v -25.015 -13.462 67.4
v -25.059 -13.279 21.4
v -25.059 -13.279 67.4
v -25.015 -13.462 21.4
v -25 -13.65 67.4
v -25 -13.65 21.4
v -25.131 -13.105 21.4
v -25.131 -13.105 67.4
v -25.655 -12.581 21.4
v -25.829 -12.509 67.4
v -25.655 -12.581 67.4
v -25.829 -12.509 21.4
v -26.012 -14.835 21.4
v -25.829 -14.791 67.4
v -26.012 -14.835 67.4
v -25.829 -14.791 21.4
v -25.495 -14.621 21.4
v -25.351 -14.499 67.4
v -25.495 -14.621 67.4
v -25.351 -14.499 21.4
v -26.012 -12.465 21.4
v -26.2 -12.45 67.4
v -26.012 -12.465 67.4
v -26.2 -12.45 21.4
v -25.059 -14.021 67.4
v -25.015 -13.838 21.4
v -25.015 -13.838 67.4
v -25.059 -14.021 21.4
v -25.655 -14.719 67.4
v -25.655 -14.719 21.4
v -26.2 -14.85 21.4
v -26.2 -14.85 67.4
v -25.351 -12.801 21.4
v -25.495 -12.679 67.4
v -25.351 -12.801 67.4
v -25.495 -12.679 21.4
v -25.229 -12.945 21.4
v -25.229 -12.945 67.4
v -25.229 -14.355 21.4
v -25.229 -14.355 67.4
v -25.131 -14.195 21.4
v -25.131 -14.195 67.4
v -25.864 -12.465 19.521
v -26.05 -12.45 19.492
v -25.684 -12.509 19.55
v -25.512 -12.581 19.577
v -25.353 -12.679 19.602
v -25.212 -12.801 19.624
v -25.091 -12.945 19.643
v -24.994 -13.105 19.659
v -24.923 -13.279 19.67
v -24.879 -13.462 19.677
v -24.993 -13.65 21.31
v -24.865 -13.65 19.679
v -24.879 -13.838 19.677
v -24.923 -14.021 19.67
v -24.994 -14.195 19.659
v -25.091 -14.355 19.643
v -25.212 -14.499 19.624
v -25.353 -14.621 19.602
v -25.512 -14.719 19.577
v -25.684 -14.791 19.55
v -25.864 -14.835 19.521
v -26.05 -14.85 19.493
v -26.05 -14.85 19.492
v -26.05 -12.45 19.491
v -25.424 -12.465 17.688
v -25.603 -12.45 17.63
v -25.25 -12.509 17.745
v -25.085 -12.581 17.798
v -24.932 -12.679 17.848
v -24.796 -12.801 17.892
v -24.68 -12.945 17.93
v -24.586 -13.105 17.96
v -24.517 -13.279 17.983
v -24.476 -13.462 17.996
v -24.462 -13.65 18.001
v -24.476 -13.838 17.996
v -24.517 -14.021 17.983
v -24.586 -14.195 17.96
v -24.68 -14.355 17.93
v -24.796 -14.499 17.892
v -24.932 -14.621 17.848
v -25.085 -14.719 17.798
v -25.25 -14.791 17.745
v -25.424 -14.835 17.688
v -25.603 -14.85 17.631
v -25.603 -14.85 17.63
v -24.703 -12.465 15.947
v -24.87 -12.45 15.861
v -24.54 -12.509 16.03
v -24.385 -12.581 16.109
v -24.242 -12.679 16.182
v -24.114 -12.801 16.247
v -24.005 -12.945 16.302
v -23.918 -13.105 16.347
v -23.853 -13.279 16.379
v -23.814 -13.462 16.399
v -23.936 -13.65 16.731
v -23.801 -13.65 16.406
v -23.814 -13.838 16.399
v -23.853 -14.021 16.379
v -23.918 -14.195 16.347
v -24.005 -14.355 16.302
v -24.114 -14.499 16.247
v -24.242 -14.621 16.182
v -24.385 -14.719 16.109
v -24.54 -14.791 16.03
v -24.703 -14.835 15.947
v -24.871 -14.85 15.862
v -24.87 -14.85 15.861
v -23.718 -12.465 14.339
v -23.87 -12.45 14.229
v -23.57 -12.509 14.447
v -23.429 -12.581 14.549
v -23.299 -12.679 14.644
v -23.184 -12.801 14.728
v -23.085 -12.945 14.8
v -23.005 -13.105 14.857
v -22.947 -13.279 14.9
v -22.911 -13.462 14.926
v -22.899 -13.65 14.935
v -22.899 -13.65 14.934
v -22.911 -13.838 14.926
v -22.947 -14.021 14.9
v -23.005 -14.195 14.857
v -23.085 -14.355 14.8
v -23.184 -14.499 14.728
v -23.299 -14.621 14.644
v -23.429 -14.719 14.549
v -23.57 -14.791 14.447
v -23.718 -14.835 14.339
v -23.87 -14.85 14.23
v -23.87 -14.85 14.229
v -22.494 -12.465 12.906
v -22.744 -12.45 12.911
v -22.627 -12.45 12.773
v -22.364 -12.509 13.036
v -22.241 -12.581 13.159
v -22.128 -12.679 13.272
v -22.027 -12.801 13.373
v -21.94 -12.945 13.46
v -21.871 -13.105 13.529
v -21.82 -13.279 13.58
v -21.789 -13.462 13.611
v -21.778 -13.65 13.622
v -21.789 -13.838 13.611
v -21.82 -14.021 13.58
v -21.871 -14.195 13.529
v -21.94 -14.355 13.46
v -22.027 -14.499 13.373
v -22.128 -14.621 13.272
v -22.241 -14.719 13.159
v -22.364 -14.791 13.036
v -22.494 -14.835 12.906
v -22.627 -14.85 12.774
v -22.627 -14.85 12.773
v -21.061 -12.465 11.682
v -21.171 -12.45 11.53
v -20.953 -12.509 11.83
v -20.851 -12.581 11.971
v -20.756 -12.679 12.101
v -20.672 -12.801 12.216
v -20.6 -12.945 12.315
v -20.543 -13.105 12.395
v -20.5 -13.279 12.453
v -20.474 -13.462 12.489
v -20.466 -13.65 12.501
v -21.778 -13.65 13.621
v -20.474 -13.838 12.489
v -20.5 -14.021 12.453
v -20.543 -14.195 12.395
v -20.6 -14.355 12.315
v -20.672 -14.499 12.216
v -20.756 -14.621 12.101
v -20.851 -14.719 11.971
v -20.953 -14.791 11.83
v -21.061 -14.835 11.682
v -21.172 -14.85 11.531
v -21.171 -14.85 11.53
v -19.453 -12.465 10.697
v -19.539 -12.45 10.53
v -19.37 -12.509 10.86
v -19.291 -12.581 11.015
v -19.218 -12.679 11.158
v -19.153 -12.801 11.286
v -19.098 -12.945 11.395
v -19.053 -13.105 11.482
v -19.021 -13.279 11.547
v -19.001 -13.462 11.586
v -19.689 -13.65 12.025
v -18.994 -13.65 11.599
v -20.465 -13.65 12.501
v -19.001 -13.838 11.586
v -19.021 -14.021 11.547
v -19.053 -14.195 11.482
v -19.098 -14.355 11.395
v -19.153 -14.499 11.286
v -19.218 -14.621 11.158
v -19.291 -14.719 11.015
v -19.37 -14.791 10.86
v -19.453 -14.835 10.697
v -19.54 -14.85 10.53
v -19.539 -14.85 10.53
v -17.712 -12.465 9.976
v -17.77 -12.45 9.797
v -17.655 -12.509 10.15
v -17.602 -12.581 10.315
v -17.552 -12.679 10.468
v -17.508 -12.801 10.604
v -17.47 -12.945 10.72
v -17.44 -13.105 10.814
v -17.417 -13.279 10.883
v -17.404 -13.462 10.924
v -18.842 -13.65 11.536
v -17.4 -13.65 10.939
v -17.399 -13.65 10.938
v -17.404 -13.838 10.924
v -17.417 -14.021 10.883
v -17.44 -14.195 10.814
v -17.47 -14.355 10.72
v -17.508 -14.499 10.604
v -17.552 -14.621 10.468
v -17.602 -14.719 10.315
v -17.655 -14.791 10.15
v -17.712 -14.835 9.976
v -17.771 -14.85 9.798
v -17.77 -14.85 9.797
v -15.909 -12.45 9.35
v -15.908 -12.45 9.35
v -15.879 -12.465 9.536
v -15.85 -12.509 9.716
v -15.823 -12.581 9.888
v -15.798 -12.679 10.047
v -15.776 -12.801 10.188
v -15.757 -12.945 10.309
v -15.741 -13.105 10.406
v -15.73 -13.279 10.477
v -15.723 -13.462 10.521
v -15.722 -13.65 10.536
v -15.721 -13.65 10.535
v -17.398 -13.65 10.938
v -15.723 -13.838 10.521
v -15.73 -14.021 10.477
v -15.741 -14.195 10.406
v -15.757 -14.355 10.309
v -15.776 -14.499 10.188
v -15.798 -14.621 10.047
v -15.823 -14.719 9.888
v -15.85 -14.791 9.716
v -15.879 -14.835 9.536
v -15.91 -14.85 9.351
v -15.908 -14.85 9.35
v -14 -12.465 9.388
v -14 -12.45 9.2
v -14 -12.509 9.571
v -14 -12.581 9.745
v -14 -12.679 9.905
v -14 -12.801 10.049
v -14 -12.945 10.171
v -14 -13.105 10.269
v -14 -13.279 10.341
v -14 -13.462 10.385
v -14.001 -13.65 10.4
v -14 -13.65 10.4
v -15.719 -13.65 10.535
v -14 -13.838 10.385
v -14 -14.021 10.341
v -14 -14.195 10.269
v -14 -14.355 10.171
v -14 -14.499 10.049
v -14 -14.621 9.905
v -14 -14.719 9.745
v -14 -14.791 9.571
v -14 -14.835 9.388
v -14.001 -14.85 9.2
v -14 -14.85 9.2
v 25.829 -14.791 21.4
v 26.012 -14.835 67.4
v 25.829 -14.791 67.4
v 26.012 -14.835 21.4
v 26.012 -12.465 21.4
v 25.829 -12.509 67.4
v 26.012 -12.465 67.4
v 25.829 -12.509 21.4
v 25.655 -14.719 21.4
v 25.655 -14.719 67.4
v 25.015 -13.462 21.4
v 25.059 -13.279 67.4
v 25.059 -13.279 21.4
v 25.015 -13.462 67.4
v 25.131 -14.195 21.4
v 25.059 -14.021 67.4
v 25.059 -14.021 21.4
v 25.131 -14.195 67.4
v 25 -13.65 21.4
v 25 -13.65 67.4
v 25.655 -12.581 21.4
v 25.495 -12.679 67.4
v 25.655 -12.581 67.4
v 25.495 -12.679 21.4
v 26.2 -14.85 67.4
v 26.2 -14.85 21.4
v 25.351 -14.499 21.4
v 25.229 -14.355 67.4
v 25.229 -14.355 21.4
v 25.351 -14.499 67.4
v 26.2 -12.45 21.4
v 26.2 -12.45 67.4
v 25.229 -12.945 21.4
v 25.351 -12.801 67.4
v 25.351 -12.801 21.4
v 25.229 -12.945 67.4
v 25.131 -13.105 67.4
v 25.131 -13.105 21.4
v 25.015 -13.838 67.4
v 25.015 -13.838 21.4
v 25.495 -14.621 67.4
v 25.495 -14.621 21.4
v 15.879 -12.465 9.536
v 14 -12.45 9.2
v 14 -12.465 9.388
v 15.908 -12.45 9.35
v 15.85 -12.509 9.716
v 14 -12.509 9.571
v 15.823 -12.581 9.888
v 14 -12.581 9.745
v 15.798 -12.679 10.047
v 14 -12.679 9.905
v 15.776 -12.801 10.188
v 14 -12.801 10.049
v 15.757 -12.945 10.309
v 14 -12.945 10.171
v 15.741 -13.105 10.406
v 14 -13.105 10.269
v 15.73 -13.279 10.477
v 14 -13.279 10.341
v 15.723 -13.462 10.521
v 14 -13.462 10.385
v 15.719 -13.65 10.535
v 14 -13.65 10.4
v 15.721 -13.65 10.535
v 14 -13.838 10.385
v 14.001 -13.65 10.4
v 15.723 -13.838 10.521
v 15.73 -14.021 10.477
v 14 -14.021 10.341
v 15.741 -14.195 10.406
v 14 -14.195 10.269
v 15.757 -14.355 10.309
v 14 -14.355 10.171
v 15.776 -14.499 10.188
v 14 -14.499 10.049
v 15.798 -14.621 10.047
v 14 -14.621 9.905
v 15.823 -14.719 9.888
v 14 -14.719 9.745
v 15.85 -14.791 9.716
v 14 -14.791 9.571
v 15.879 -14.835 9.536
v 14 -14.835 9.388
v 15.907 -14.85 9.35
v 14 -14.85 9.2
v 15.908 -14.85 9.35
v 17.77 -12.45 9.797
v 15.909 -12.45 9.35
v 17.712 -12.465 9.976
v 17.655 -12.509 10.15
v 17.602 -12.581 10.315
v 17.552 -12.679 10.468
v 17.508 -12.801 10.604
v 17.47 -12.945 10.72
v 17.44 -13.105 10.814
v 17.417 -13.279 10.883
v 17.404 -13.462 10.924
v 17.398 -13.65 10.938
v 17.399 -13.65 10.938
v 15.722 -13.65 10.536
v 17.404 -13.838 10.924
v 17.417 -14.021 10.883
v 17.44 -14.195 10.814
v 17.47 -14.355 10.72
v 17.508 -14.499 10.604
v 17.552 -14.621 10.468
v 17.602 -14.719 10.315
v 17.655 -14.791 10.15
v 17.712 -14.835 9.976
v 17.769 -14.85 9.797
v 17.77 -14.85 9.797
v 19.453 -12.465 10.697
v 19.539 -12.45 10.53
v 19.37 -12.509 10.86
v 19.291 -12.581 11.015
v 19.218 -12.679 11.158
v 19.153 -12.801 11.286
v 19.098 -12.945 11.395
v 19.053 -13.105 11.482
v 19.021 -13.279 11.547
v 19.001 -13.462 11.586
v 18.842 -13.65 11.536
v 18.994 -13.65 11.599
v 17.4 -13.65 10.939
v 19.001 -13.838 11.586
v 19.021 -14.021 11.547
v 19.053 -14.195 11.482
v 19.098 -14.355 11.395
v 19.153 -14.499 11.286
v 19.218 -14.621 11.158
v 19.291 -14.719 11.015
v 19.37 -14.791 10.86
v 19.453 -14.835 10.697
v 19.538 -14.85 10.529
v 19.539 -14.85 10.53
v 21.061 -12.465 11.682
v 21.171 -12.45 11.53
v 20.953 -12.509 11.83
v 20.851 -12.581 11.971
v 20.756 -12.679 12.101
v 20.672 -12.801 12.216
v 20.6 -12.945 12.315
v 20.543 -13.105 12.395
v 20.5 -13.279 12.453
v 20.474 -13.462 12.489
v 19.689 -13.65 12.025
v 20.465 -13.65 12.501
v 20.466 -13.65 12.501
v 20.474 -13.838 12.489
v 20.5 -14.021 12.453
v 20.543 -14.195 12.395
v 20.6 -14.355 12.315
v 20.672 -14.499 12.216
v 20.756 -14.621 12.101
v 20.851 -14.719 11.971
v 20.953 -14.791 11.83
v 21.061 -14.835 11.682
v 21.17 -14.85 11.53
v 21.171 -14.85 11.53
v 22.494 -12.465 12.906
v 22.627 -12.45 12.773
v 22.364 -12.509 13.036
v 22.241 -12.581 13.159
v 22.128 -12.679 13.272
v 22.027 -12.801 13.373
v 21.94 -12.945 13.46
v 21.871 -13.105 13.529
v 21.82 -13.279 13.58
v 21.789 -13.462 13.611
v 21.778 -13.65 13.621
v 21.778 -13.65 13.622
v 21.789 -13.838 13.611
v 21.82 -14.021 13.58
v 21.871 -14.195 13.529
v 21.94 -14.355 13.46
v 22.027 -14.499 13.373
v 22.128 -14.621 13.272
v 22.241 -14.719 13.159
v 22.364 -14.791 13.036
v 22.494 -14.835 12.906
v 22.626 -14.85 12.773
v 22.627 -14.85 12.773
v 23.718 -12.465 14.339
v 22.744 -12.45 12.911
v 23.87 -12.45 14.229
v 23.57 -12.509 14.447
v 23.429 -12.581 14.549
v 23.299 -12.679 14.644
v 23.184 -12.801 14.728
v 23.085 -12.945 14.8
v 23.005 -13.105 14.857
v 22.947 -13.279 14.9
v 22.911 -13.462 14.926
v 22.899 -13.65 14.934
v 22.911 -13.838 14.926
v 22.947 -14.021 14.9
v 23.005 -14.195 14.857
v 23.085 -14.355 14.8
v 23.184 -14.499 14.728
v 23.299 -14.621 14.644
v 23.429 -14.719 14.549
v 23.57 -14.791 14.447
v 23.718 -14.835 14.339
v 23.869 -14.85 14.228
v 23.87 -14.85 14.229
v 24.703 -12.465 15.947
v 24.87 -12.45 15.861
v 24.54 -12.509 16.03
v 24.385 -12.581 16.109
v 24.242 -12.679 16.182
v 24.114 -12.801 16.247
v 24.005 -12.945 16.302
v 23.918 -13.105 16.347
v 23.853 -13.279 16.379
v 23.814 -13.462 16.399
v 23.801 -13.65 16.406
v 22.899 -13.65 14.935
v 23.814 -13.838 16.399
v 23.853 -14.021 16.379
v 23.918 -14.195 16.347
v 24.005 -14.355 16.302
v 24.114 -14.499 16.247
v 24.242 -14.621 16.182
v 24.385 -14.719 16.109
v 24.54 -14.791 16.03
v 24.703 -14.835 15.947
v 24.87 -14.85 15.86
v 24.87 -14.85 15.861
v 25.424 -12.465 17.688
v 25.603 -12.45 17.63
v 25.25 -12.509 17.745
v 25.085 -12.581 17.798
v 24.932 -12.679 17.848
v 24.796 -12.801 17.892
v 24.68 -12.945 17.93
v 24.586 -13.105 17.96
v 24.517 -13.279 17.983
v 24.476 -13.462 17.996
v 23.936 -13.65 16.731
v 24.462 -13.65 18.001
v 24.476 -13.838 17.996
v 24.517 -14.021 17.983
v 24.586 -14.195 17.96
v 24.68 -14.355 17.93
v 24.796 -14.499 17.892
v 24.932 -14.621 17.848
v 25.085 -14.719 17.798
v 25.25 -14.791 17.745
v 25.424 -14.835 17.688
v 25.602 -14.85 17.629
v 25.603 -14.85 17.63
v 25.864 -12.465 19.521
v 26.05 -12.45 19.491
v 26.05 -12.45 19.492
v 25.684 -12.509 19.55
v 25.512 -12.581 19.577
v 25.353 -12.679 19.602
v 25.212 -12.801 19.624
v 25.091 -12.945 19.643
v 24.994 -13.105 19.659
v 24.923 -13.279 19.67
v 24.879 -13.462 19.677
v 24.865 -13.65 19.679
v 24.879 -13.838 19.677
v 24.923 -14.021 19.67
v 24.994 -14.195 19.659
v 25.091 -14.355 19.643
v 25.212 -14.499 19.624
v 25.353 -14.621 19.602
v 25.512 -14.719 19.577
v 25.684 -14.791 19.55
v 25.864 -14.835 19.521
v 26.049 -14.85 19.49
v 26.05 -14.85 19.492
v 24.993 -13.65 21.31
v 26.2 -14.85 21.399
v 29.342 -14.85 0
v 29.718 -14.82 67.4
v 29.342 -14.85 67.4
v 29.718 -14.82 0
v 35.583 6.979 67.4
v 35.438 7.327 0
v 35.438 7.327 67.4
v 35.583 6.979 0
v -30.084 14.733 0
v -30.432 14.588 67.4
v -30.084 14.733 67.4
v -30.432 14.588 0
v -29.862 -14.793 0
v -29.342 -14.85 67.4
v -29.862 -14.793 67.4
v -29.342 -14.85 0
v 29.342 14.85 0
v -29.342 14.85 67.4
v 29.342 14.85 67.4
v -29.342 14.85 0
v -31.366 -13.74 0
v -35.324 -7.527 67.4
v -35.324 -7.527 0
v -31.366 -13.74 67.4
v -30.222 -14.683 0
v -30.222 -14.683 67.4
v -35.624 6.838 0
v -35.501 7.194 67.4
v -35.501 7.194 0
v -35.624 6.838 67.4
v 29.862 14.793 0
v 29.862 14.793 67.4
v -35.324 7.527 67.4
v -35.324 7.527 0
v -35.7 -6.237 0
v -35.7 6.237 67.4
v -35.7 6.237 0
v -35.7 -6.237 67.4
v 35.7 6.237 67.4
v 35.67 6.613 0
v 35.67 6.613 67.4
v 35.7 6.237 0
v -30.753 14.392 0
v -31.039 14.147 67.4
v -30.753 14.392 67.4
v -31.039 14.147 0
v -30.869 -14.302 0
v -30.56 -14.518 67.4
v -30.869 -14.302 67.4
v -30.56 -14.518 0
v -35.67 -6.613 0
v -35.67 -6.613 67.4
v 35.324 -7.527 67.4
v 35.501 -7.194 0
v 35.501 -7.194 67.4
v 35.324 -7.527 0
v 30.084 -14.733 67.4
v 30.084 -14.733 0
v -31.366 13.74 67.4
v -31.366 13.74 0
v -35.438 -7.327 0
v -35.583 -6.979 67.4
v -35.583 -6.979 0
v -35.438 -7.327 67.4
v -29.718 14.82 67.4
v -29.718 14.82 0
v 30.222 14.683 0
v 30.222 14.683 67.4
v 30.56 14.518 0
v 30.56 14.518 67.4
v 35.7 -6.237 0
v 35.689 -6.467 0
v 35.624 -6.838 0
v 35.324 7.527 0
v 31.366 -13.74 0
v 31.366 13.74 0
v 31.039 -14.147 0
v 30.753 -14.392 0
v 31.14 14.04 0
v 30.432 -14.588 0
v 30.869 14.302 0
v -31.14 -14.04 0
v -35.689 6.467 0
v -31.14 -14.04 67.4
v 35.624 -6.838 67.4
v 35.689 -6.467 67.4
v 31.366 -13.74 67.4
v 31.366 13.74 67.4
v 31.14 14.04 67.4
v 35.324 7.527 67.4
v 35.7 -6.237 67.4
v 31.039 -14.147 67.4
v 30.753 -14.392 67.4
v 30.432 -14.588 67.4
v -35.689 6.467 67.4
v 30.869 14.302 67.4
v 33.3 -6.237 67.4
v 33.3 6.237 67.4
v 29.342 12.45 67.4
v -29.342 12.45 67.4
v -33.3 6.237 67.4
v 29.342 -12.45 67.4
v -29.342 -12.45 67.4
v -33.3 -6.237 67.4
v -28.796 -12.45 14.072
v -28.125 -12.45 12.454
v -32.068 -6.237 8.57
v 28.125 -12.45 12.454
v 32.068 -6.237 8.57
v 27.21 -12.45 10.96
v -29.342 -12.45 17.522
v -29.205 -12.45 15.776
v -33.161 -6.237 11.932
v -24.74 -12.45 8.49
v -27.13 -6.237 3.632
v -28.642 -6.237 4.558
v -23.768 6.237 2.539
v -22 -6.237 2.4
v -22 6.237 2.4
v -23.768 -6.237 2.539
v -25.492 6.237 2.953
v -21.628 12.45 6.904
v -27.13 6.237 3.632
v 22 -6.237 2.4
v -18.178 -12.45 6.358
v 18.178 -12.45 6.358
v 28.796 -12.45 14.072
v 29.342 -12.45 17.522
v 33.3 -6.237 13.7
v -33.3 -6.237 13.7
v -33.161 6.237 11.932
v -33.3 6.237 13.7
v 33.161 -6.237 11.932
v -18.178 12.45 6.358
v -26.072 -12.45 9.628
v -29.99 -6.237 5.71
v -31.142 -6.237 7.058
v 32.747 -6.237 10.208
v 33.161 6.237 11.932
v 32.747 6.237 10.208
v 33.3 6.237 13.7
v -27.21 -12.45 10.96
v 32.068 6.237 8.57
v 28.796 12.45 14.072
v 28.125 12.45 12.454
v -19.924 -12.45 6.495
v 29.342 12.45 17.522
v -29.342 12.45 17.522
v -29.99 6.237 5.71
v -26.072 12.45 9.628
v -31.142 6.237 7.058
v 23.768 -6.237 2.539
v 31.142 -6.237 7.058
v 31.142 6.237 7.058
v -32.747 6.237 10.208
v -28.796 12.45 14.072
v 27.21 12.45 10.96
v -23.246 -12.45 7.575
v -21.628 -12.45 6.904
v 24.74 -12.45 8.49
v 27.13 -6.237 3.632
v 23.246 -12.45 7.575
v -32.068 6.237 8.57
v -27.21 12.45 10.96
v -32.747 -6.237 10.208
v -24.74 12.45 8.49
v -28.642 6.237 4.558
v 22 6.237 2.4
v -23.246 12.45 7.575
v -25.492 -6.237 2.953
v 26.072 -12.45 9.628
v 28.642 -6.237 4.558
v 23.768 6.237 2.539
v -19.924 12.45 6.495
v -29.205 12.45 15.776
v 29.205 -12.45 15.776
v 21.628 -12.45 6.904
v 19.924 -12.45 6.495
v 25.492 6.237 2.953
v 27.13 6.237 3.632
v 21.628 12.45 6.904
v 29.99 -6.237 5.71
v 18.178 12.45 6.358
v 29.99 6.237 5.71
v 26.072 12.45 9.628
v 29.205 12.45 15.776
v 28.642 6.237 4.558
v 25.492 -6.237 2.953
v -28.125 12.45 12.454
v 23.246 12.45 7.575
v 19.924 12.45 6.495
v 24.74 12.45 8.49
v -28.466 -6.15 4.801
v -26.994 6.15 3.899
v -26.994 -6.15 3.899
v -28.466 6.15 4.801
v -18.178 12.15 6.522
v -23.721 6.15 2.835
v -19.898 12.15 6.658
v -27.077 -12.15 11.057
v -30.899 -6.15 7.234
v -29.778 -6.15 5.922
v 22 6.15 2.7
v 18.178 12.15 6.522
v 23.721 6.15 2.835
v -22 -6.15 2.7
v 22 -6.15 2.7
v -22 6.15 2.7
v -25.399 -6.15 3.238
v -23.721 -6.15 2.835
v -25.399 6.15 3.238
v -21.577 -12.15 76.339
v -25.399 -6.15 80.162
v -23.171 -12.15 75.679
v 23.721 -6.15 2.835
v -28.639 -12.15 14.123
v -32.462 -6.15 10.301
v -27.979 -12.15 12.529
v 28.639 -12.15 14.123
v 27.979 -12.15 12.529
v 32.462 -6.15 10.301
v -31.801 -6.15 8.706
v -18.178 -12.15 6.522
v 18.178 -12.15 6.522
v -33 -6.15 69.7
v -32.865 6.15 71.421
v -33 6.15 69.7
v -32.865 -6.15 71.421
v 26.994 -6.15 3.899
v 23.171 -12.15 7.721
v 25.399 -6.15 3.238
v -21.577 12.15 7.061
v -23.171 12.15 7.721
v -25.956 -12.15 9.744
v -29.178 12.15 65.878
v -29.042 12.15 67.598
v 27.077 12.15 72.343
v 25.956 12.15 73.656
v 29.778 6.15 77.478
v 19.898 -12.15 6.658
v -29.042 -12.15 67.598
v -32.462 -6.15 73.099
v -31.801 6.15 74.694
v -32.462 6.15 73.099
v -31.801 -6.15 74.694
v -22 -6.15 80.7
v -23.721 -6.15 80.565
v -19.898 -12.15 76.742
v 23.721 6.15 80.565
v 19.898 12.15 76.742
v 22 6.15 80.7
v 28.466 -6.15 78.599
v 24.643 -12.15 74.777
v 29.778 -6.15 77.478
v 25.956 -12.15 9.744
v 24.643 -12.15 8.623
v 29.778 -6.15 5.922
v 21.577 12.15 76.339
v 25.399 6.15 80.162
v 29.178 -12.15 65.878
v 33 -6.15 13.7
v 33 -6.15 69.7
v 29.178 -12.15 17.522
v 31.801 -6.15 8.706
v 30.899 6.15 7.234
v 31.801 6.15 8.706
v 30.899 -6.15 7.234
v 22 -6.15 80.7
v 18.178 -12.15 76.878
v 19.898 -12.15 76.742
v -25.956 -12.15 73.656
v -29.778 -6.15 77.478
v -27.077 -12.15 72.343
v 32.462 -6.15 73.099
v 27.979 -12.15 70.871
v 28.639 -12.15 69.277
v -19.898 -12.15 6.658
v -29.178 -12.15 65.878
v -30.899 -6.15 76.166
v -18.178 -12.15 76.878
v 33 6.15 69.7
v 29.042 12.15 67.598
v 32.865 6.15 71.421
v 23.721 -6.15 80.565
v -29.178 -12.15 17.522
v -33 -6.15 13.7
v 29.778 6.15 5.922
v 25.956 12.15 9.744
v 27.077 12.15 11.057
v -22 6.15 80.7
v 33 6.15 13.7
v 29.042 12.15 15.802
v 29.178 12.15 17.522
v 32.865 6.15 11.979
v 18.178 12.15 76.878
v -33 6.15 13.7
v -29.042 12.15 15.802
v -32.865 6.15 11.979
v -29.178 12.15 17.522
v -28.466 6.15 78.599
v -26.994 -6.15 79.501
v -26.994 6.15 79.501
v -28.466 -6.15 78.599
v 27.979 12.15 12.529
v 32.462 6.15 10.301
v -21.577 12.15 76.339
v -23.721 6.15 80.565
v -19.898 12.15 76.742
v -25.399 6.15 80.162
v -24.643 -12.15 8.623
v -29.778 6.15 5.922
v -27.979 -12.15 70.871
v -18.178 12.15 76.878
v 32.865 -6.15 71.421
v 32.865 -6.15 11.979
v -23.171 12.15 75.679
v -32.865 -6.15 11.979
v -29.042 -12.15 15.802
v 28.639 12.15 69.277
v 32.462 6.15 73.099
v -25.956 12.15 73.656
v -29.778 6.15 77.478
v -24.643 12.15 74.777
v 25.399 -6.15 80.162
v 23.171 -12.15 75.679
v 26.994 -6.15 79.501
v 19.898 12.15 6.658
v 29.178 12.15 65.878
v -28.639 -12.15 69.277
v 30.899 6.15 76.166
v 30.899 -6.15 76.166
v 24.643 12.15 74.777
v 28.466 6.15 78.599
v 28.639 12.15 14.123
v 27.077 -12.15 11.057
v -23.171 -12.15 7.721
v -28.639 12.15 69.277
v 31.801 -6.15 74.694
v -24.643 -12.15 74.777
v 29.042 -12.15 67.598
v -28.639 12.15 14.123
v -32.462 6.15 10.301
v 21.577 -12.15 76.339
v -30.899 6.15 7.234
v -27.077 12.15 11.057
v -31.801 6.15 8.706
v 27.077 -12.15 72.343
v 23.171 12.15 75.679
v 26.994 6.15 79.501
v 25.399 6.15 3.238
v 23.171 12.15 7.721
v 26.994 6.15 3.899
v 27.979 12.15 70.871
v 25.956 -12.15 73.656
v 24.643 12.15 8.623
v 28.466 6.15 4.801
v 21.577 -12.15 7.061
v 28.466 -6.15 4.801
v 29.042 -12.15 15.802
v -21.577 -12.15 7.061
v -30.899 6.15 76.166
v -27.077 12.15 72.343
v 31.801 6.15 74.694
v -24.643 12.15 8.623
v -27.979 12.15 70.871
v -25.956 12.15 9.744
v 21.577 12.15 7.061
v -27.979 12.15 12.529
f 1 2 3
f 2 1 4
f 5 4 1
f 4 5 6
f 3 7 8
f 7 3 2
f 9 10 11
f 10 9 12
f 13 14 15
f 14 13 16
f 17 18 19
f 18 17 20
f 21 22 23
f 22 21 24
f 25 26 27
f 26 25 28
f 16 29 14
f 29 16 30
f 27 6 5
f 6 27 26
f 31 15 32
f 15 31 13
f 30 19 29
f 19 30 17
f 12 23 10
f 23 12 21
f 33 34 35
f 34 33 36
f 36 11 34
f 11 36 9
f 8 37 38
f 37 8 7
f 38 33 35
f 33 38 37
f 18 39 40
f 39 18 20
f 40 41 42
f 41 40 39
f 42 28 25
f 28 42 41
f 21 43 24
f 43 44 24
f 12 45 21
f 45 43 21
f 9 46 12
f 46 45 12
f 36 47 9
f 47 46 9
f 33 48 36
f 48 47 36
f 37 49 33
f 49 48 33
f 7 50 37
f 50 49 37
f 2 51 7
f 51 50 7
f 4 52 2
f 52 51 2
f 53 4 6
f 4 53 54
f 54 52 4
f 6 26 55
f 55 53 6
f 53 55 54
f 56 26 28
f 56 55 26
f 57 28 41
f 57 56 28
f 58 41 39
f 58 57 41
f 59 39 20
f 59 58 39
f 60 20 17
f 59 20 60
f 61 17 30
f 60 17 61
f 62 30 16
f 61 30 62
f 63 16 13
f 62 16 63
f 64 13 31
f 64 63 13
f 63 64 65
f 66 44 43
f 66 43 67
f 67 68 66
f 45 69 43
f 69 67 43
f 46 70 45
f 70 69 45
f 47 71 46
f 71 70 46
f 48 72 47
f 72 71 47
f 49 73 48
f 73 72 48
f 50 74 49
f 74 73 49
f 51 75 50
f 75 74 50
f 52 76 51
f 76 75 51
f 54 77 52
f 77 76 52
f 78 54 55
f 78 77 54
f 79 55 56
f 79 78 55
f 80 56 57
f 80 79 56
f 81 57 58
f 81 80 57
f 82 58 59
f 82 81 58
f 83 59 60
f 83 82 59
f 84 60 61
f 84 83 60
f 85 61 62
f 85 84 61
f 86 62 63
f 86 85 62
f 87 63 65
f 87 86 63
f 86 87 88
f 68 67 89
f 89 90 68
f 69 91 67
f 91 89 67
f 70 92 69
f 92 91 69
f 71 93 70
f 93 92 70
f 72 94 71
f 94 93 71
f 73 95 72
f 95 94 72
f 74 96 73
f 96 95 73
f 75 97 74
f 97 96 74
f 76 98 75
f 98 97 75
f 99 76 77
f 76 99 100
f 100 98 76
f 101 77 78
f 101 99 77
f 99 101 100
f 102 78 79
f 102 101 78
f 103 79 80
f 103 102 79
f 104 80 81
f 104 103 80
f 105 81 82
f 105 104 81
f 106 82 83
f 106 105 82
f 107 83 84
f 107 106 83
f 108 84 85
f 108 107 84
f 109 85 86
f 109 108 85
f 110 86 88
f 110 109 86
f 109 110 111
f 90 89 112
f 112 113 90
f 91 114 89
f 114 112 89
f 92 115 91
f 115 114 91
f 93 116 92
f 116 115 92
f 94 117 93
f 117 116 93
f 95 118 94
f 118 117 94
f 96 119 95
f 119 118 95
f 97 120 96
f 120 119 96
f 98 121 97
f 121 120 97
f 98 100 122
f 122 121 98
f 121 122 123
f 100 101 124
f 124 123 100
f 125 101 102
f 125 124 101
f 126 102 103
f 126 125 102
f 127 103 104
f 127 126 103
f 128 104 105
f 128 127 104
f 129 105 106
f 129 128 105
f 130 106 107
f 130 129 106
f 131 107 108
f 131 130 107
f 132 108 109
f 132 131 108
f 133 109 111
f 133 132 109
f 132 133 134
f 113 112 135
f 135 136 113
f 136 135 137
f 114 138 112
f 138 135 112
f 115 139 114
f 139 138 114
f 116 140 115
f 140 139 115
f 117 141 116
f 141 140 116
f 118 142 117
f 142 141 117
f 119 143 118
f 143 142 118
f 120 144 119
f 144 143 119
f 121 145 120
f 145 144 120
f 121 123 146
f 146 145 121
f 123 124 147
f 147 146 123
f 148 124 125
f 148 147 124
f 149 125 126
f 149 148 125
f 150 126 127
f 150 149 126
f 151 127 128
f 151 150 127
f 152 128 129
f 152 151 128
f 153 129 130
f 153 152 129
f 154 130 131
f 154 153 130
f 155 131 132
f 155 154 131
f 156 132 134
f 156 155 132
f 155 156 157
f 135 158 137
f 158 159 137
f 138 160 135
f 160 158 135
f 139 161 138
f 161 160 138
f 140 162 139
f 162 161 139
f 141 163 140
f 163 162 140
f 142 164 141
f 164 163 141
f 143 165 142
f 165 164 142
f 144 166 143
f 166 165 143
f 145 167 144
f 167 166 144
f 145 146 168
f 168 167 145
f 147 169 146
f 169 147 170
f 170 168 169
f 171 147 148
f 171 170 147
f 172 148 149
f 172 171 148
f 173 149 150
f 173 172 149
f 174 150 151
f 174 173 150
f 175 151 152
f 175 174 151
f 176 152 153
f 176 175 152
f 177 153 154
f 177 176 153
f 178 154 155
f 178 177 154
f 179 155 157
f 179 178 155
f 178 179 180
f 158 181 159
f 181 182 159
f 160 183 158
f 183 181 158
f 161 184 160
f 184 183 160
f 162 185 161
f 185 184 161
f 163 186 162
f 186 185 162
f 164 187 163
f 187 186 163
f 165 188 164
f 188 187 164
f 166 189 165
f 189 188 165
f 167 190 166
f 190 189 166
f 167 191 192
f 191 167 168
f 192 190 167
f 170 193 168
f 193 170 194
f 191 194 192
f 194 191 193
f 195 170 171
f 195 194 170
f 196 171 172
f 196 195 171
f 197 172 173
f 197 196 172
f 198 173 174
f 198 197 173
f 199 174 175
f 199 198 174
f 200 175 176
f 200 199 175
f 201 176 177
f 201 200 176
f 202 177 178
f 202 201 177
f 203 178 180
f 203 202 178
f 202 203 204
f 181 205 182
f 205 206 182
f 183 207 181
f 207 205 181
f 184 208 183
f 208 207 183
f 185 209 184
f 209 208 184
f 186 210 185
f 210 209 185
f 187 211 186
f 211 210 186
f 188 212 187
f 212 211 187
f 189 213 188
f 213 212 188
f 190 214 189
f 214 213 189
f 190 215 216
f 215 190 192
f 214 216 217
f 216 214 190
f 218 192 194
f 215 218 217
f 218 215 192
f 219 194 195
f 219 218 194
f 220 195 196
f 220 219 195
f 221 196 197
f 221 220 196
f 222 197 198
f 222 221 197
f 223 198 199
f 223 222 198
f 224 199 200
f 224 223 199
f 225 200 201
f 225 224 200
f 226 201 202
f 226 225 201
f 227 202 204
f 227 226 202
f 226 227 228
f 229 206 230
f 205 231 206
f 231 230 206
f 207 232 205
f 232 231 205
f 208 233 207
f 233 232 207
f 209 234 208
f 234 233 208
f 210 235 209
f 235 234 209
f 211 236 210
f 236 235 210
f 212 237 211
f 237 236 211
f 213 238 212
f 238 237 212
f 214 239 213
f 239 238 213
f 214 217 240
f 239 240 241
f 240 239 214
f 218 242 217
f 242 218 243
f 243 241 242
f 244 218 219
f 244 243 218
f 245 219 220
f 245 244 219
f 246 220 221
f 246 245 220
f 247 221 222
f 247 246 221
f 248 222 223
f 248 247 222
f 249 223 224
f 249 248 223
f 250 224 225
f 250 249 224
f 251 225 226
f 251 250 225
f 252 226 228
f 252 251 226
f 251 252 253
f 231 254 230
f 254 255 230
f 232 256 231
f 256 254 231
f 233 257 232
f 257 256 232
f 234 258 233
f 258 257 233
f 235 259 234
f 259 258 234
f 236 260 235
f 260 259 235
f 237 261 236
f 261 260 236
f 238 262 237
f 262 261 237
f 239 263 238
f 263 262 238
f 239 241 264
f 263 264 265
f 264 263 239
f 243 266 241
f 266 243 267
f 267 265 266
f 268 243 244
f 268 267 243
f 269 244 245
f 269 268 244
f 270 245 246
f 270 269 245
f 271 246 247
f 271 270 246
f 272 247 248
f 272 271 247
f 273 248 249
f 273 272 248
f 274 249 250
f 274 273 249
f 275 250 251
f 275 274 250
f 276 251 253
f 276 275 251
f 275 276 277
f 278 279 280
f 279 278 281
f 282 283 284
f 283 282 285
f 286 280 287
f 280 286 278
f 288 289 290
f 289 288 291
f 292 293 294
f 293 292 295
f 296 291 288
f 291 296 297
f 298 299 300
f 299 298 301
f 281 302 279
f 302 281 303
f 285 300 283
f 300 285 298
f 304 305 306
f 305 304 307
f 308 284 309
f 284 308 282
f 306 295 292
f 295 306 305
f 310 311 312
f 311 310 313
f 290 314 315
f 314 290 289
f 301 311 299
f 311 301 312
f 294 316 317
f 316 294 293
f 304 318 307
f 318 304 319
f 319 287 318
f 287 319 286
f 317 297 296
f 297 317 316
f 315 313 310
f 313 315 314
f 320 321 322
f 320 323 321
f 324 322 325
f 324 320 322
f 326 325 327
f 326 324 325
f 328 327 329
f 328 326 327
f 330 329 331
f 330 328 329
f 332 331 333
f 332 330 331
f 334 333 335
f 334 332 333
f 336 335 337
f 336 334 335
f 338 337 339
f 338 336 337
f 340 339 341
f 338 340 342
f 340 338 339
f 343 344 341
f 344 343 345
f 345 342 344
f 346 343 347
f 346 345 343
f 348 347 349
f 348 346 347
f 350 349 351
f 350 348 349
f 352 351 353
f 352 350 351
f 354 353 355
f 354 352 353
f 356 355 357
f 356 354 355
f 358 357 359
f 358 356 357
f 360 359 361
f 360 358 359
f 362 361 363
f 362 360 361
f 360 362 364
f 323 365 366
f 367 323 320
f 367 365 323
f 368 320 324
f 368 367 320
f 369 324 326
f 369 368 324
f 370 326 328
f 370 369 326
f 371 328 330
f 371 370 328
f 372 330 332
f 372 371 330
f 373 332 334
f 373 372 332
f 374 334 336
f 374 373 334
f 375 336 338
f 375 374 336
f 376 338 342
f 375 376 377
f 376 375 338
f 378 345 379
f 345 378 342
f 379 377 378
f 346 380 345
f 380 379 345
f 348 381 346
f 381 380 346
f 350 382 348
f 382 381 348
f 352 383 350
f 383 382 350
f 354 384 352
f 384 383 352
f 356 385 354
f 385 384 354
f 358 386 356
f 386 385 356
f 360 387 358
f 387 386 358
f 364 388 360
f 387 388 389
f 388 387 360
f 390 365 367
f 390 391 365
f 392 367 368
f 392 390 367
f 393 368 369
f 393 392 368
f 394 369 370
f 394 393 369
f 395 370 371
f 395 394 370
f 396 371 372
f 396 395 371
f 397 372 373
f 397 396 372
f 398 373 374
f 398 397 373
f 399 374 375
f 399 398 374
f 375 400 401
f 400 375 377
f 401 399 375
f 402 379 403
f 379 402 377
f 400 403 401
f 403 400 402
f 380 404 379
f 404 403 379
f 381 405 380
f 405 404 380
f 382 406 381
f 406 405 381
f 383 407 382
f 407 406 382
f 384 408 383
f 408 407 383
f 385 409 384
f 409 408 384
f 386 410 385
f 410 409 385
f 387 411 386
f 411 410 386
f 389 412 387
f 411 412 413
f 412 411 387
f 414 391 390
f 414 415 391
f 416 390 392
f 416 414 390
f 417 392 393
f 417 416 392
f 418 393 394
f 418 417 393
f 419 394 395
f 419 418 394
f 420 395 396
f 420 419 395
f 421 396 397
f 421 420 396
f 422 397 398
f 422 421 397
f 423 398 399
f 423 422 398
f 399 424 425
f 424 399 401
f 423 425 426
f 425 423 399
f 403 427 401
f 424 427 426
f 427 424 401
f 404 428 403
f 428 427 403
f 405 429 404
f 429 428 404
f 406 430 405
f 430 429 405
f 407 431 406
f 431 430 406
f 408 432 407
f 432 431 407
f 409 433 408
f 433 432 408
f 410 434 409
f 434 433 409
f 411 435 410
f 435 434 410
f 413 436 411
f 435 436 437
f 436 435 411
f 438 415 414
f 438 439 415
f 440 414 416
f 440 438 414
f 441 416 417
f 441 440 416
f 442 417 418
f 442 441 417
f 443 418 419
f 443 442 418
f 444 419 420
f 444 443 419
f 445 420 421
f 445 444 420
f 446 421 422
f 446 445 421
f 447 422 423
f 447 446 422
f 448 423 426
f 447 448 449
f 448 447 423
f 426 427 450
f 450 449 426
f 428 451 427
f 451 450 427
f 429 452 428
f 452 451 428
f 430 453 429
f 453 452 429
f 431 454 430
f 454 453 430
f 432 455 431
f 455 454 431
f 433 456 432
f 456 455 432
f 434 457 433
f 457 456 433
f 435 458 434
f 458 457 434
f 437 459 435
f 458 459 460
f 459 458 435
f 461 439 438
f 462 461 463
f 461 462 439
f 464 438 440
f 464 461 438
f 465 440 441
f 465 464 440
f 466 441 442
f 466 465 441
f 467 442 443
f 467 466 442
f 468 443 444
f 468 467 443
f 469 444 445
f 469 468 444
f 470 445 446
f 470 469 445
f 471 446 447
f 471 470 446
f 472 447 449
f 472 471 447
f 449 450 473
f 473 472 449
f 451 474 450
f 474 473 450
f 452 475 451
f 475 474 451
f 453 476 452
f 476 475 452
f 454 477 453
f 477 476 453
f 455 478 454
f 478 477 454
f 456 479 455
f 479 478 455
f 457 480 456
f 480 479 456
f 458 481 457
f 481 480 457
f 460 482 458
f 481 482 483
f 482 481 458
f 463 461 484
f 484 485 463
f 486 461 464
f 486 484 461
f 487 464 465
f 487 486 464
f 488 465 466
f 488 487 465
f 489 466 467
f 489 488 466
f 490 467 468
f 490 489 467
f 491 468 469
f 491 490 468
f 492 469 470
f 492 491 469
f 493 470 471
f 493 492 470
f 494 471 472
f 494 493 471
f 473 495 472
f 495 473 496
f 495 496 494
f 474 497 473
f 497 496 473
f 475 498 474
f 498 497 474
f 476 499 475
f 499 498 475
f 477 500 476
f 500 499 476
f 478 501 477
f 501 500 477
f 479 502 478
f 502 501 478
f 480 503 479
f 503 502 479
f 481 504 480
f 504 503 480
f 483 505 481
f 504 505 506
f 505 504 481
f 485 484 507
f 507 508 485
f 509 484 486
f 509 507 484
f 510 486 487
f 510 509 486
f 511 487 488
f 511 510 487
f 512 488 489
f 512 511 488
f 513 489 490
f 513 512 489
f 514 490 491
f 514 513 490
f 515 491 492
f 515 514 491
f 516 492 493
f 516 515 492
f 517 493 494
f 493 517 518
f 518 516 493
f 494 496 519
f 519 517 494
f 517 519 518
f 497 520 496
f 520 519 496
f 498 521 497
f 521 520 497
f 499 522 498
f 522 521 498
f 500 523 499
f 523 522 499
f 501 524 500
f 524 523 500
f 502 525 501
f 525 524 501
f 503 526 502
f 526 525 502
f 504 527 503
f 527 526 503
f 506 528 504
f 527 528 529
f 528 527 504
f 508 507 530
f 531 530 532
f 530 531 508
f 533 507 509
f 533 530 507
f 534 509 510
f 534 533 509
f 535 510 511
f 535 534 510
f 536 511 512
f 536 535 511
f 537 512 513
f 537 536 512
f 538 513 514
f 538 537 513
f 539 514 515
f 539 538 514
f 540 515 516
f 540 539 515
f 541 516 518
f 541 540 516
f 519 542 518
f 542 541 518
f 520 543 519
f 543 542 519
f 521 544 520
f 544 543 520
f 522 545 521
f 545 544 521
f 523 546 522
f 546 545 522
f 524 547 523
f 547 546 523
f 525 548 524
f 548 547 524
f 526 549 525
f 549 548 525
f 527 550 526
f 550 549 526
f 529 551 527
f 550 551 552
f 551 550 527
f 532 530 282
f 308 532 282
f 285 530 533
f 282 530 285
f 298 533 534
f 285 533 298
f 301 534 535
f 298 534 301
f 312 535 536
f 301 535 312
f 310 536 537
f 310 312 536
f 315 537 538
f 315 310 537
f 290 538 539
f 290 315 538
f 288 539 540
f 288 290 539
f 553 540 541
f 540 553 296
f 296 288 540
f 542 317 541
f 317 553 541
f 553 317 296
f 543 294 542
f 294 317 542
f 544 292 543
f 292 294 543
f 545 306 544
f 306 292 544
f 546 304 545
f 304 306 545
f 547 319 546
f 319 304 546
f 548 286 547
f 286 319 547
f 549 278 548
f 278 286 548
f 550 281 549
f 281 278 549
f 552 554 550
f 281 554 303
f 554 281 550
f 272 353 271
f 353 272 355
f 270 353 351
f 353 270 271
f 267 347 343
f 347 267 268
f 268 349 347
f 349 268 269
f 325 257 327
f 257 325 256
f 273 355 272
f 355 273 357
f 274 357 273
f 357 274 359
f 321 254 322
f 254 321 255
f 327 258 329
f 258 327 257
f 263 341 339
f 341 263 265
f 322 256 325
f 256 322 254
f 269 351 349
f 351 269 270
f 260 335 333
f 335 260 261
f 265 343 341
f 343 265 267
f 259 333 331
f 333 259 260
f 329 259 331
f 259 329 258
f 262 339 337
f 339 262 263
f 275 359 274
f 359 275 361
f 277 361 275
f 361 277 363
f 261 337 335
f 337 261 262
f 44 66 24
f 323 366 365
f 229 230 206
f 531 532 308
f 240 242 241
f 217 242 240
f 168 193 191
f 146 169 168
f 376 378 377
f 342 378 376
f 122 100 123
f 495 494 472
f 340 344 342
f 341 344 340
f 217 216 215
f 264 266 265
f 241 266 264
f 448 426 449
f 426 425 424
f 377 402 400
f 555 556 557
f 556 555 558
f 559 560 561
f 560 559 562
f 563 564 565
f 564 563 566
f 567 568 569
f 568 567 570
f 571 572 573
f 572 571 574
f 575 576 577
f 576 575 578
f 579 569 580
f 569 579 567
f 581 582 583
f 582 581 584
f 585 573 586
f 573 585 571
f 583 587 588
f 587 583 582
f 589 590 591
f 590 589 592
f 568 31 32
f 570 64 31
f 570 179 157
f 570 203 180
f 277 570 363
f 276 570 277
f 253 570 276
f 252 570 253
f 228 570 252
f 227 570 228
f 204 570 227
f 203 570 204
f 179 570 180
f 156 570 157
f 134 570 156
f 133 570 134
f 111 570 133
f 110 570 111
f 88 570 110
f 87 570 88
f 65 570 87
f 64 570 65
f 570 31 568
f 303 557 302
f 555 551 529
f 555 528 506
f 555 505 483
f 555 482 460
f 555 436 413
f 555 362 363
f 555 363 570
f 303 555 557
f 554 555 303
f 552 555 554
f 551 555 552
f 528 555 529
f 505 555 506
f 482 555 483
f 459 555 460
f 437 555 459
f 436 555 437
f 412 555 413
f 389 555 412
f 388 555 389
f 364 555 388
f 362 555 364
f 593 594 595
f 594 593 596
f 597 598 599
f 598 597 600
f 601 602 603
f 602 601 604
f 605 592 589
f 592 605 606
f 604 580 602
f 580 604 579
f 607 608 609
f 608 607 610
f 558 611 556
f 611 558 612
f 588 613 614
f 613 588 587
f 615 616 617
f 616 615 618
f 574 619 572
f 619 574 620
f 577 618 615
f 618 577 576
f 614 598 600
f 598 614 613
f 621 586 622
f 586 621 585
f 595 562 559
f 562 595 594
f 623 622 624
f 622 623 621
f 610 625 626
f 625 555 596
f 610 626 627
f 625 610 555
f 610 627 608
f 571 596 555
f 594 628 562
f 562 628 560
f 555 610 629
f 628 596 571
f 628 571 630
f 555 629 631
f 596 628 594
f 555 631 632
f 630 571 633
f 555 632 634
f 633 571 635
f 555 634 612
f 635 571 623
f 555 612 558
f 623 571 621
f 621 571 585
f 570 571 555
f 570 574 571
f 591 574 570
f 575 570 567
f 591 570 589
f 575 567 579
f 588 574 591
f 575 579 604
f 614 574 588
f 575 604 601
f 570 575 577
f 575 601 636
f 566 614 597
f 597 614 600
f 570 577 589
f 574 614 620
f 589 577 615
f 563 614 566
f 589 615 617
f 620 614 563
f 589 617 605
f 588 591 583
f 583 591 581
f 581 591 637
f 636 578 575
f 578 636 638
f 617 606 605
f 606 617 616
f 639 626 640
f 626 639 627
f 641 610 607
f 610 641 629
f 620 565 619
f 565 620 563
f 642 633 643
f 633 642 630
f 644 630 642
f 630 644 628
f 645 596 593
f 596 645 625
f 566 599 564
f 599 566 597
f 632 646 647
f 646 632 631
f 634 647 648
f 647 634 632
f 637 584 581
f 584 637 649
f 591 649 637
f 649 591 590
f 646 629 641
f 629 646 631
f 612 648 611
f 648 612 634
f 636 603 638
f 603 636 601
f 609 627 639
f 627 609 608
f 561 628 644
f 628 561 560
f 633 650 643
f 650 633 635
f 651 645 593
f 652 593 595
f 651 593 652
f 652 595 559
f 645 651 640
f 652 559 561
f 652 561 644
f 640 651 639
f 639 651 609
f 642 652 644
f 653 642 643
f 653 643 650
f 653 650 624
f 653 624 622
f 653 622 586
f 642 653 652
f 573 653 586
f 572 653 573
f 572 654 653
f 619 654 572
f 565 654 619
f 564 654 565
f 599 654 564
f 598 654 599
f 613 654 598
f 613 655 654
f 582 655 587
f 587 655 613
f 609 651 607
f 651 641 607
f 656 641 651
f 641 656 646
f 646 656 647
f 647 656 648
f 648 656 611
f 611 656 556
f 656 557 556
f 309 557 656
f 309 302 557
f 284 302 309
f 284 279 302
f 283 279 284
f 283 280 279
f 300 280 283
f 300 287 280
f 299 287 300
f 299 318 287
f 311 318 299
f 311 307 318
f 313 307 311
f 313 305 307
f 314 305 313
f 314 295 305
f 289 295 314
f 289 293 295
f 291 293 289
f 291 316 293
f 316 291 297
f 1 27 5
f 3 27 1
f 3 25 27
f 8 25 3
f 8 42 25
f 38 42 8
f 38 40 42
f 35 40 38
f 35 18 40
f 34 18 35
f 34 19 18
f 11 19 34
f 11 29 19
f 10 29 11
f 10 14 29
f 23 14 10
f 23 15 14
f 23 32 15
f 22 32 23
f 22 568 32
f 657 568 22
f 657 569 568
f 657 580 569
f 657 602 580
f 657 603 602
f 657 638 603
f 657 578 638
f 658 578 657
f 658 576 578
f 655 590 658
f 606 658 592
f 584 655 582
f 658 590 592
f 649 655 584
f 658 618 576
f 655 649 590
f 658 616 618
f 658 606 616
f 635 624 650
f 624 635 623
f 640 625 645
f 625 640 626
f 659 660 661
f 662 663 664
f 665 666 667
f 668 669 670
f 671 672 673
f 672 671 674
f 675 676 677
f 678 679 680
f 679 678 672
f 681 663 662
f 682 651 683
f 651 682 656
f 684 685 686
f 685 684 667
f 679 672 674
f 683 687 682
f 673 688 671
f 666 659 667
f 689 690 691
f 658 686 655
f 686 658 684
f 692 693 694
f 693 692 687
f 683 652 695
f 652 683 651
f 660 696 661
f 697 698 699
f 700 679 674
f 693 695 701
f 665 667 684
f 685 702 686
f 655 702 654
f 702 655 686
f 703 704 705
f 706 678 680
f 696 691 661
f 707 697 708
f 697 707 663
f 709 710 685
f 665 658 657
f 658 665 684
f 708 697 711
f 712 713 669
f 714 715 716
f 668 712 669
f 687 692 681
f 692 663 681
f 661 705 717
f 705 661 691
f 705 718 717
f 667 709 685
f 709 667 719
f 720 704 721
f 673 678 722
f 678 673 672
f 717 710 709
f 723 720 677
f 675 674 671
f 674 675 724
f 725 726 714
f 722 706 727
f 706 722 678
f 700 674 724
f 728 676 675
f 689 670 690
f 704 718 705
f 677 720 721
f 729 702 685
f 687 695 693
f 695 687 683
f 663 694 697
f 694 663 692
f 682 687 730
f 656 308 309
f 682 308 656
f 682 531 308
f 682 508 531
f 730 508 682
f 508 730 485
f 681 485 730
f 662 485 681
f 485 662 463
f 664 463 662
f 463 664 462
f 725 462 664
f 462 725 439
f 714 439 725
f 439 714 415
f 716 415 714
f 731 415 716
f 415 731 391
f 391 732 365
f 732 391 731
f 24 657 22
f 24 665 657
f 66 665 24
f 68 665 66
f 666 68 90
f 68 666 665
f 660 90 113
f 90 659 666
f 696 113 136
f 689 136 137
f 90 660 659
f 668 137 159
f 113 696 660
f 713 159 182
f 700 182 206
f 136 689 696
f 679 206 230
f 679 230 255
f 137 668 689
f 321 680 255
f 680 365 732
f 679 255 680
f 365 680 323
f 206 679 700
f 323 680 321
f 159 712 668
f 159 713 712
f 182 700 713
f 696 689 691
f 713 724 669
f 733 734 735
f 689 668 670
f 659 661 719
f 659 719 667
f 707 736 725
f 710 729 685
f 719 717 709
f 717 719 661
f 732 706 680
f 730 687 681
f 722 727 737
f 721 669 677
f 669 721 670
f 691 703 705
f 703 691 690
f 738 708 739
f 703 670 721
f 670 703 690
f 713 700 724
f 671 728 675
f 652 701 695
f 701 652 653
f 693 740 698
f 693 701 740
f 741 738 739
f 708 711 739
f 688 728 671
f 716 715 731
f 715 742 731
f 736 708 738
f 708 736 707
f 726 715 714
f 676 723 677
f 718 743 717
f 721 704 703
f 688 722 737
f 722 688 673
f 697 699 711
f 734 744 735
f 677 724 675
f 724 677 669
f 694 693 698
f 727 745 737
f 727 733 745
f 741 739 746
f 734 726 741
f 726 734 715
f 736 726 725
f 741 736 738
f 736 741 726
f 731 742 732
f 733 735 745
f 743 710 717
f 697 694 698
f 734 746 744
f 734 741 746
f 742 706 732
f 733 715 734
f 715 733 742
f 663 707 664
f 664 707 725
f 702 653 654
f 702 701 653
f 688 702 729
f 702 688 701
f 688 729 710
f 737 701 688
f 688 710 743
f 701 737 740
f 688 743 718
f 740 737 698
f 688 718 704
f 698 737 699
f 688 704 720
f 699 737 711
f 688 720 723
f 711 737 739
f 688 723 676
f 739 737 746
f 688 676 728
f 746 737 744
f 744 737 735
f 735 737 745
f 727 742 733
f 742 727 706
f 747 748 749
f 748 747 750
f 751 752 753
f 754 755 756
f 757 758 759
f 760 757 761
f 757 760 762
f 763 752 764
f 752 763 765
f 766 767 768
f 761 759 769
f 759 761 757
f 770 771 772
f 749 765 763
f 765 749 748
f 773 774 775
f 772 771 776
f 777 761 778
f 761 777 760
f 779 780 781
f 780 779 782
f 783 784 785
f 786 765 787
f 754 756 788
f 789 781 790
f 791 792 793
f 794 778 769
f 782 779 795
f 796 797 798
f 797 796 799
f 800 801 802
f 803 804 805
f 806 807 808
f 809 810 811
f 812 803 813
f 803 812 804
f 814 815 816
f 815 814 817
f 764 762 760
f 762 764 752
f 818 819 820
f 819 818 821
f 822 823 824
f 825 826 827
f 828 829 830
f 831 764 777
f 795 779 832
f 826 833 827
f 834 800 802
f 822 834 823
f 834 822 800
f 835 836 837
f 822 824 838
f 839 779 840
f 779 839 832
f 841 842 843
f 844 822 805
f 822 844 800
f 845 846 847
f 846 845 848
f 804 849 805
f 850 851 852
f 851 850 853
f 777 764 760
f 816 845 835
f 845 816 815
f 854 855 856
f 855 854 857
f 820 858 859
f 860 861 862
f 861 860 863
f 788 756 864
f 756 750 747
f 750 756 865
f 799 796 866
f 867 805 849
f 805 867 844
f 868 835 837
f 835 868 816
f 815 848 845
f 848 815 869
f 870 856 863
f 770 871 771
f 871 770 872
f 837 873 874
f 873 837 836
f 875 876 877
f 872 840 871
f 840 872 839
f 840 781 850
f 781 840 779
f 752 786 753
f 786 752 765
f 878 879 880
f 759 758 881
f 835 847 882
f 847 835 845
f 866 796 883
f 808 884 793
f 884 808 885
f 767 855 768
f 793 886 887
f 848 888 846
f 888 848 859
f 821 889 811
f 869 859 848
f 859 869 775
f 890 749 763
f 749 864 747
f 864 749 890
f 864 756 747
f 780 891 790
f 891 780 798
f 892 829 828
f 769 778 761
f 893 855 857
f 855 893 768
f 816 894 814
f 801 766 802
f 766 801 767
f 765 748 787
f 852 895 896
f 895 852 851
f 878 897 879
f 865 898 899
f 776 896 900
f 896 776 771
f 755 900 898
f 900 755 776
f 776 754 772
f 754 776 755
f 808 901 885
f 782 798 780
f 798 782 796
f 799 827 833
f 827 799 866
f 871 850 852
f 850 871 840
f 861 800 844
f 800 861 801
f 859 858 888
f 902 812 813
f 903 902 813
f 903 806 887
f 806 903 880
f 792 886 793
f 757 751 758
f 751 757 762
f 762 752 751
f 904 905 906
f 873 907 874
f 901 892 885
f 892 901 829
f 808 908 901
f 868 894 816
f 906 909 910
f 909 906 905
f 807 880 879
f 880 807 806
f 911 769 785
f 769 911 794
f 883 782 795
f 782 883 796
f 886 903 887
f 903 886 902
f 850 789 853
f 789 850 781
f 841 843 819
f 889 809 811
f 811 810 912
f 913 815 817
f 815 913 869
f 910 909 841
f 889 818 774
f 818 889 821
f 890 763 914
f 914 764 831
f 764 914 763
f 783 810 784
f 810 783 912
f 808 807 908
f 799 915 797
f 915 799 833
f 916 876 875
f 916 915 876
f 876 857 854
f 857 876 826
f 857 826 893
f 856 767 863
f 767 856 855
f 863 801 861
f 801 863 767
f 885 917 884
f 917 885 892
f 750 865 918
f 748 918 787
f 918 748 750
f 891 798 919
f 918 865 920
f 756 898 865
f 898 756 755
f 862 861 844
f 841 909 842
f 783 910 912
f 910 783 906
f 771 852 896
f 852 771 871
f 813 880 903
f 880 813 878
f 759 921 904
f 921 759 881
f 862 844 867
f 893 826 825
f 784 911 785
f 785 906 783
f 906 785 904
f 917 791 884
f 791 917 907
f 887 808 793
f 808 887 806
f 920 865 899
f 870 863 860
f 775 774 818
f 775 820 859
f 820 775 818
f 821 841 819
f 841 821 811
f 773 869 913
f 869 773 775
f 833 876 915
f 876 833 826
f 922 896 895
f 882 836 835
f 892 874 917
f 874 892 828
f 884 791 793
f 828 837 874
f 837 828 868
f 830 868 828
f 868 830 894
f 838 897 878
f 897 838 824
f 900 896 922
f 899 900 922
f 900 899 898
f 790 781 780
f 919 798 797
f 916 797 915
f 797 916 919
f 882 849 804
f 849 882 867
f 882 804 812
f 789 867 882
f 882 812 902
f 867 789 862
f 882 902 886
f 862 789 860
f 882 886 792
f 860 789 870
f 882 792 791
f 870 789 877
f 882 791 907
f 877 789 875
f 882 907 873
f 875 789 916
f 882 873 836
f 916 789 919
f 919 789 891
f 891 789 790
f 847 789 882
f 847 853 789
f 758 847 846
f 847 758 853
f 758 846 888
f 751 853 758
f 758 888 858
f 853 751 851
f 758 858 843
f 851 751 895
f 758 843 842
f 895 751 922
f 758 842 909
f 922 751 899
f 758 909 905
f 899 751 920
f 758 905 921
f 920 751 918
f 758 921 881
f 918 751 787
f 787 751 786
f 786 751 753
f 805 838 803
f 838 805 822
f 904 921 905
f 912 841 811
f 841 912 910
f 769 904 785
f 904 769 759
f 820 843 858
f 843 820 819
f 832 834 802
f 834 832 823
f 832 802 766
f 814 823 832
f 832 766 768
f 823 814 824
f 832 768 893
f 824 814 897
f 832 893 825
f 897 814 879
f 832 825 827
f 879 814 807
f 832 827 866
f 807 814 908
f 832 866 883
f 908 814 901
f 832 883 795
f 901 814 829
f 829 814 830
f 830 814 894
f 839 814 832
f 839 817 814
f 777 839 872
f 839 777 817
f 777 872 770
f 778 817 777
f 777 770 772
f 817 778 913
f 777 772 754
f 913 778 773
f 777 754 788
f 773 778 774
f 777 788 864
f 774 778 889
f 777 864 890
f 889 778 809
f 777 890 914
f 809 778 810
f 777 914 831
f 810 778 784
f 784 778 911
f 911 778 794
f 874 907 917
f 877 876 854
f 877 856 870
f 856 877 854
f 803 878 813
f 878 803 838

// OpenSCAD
// file: ../lib/meshology-l1-holster-lib.scad
// Meshology L1 holster: a TPU channel the radio slides down into.
// X is side to side, Y front (-) to back (+), Z up. The holster prints
// standing on its floor, open top up, so every wall is vertical.

// BEGIN_PARAMS
// Radio, front face to back face
radio_thickness = 24.3;
// Radio, side to side
radio_width = 66;
// Radio body height, bottom to top
radio_height = 78;
// Inside angle between the front face and a diagonal face (degrees)
radio_corner_angle = 122.5;
// How far each diagonal face reaches front-to-back (not measured yet).
// The front and back faces are bevelled the same way on all four edges.
radio_chamfer_depth = 6;
// Radius of the body's four corners seen from the front; the front and
// back faces' corners share their centres
radio_corner_radius = 11;
// Gap between radio and holster, per side
tolerance = 0.3;
// Wall, back and floor thickness
wall = 2.4;
// Inside depth of the channel, floor to rim
pocket_depth = 65;
// How far the front walls reach in from the radio's sides
front_lip = 8;
// Front wall left standing above the floor
front_sill = 8;
// Radius of the front cutout's lower corners, matching the radio's
cutout_corner_radius = 11;
// END_PARAMS

// The diagonal face rises radio_chamfer_depth over this much width.
radio_chamfer_width = radio_chamfer_depth / tan(180 - radio_corner_angle);

assert(radio_chamfer_depth * 2 < radio_thickness, "diagonal faces would meet front to back");
assert(radio_chamfer_width * 2 < radio_width, "diagonal faces would meet side to side");
assert(radio_corner_radius > radio_chamfer_width, "face corners would be sharper than a point");
assert(radio_corner_radius * 2 < radio_width - 2 * radio_chamfer_width, "face corners would meet side to side");
assert(front_lip > radio_chamfer_width, "front lip must reach past the diagonal face onto the front face");
assert(front_lip * 2 < radio_width, "front lips would close the front");
assert(cutout_corner_radius <= pocket_depth - front_sill, "cutout corner taller than the cutout");

module radio_outline() {
  w = radio_width / 2;
  t = radio_thickness / 2;
  cw = radio_chamfer_width;
  c = radio_chamfer_depth;
  polygon([
    [-w + cw, -t], [w - cw, -t], [w, -t + c], [w, t - c],
    [w - cw, t], [-w + cw, t], [-w, t - c], [-w, -t + c]
  ]);
}

module pocket_outline() {
  offset(delta = tolerance) radio_outline();
}

// [width, depth] of a bevel after its body grows by d on every face.
function grown_bevel(cw, c, d) =
  let (a = atan(c / cw), e = cw * sin(a) + d * (sin(a) + cos(a) - 1))
  [e / sin(a), e / cos(a)];

// The radio grown by d on every face, bottom at z = 0. Seen from the front
// its outline and its front and back faces are rounded rectangles whose
// corners share centres, so the bevel is the same width all round. It's a
// hull of one cylinder per corner: the outline's spanning the full-width
// band, and a thin one at each face. stretch lifts the top corners, to
// open a channel above the radio.
module radio_body(d = 0, stretch = 0) {
  r = radio_corner_radius;
  cw = radio_chamfer_width;
  bev = grown_bevel(cw, radio_chamfer_depth, d);
  t = radio_thickness / 2 + d;
  face_r = r + d + cw - bev[0];
  band = 2 * (t - bev[1]);
  hull() {
    for (sx = [-1, 1], z = [r, radio_height - r + stretch]) {
      translate([sx * (radio_width / 2 - r), -band / 2, z])
        rotate([-90, 0, 0]) cylinder(r = r + d, h = band);
    }
    for (sx = [-1, 1], z = [cw + r, radio_height - cw - r + stretch], y = [-t, t - 0.01]) {
      translate([sx * (radio_width / 2 - cw - r), y, z])
        rotate([-90, 0, 0]) cylinder(r = face_r, h = 0.01);
    }
  }
}

// Grown down by the clearance too, so the floor sits tolerance under
// the radio; the top runs past the rim so the channel stays open.
module pocket() {
  translate([0, 0, wall + tolerance])
    radio_body(tolerance, pocket_depth);
}

cutout_half = radio_width / 2 - front_lip;
cutout_bottom = wall + front_sill;
cutout_top = wall + pocket_depth + 1;
// Mid-plane of the flat front wall, where the cutout's edge runs.
front_wall_mid = -(radio_thickness / 2 + tolerance + wall / 2);
// The cutout's edge is rounded in a full half-round across the wall.
cutout_edge_radius = wall / 2;

// The cutout seen from the front, in (x, z), grown by g.
module cutout_profile(g = 0) {
  r = cutout_corner_radius;
  hull() {
    for (x = [-cutout_half + r, cutout_half - r]) translate([x, cutout_bottom + r]) circle(r = r + g);
    translate([-cutout_half - g, cutout_bottom + r]) square([2 * (cutout_half + g), cutout_top - cutout_bottom - r]);
  }
}

// Cut from outside the front wall back to y_end, toward the back.
module cutout_through(g, y_end) {
  y0 = -radio_thickness / 2 - tolerance - wall - 1;
  translate([0, y_end, 0]) rotate([90, 0, 0]) linear_extrude(y_end - y0) cutout_profile(g);
}

// A round rod along the cutout's edge, one edge-radius in from it, in the
// wall's mid-plane: what the edge rounds to.
module cutout_edge_rod() {
  r = cutout_corner_radius;
  e = cutout_edge_radius;
  cz = cutout_bottom + r;
  for (sx = [-1, 1]) {
    translate([sx * (cutout_half + e), front_wall_mid, cz]) cylinder(r = e, h = cutout_top - cz);
    translate([sx * (cutout_half - r), front_wall_mid, cz])
      rotate([90, 0, 0]) rotate([0, 0, sx < 0 ? 180 : 270])
        rotate_extrude(angle = 90) translate([r + e, 0]) circle(r = e);
  }
  translate([-(cutout_half - r), front_wall_mid, cutout_bottom - e])
    rotate([0, 90, 0]) cylinder(r = e, h = 2 * (cutout_half - r));
}

module front_cutout() {
  cutout_through(0, radio_thickness / 2);
  // The band within an edge-radius of the opening, through the wall,
  // less the rod it rounds to.
  difference() {
    cutout_through(cutout_edge_radius, -radio_thickness / 2 - tolerance + 0.5);
    cutout_edge_rod();
  }
}

module holster() {
  difference() {
    linear_extrude(wall + pocket_depth)
      offset(r = wall) pocket_outline();
    pocket();
    front_cutout();
  }
}

// Reference body for the preview: the radio seated on the floor.
module radio() {
  translate([0, 0, wall + tolerance]) radio_body();
}
// main file
include <../lib/meshology-l1-holster-lib.scad>;
$fn = 40;
color("#2f7fd8") holster();
color("#9aa0a6") radio();
